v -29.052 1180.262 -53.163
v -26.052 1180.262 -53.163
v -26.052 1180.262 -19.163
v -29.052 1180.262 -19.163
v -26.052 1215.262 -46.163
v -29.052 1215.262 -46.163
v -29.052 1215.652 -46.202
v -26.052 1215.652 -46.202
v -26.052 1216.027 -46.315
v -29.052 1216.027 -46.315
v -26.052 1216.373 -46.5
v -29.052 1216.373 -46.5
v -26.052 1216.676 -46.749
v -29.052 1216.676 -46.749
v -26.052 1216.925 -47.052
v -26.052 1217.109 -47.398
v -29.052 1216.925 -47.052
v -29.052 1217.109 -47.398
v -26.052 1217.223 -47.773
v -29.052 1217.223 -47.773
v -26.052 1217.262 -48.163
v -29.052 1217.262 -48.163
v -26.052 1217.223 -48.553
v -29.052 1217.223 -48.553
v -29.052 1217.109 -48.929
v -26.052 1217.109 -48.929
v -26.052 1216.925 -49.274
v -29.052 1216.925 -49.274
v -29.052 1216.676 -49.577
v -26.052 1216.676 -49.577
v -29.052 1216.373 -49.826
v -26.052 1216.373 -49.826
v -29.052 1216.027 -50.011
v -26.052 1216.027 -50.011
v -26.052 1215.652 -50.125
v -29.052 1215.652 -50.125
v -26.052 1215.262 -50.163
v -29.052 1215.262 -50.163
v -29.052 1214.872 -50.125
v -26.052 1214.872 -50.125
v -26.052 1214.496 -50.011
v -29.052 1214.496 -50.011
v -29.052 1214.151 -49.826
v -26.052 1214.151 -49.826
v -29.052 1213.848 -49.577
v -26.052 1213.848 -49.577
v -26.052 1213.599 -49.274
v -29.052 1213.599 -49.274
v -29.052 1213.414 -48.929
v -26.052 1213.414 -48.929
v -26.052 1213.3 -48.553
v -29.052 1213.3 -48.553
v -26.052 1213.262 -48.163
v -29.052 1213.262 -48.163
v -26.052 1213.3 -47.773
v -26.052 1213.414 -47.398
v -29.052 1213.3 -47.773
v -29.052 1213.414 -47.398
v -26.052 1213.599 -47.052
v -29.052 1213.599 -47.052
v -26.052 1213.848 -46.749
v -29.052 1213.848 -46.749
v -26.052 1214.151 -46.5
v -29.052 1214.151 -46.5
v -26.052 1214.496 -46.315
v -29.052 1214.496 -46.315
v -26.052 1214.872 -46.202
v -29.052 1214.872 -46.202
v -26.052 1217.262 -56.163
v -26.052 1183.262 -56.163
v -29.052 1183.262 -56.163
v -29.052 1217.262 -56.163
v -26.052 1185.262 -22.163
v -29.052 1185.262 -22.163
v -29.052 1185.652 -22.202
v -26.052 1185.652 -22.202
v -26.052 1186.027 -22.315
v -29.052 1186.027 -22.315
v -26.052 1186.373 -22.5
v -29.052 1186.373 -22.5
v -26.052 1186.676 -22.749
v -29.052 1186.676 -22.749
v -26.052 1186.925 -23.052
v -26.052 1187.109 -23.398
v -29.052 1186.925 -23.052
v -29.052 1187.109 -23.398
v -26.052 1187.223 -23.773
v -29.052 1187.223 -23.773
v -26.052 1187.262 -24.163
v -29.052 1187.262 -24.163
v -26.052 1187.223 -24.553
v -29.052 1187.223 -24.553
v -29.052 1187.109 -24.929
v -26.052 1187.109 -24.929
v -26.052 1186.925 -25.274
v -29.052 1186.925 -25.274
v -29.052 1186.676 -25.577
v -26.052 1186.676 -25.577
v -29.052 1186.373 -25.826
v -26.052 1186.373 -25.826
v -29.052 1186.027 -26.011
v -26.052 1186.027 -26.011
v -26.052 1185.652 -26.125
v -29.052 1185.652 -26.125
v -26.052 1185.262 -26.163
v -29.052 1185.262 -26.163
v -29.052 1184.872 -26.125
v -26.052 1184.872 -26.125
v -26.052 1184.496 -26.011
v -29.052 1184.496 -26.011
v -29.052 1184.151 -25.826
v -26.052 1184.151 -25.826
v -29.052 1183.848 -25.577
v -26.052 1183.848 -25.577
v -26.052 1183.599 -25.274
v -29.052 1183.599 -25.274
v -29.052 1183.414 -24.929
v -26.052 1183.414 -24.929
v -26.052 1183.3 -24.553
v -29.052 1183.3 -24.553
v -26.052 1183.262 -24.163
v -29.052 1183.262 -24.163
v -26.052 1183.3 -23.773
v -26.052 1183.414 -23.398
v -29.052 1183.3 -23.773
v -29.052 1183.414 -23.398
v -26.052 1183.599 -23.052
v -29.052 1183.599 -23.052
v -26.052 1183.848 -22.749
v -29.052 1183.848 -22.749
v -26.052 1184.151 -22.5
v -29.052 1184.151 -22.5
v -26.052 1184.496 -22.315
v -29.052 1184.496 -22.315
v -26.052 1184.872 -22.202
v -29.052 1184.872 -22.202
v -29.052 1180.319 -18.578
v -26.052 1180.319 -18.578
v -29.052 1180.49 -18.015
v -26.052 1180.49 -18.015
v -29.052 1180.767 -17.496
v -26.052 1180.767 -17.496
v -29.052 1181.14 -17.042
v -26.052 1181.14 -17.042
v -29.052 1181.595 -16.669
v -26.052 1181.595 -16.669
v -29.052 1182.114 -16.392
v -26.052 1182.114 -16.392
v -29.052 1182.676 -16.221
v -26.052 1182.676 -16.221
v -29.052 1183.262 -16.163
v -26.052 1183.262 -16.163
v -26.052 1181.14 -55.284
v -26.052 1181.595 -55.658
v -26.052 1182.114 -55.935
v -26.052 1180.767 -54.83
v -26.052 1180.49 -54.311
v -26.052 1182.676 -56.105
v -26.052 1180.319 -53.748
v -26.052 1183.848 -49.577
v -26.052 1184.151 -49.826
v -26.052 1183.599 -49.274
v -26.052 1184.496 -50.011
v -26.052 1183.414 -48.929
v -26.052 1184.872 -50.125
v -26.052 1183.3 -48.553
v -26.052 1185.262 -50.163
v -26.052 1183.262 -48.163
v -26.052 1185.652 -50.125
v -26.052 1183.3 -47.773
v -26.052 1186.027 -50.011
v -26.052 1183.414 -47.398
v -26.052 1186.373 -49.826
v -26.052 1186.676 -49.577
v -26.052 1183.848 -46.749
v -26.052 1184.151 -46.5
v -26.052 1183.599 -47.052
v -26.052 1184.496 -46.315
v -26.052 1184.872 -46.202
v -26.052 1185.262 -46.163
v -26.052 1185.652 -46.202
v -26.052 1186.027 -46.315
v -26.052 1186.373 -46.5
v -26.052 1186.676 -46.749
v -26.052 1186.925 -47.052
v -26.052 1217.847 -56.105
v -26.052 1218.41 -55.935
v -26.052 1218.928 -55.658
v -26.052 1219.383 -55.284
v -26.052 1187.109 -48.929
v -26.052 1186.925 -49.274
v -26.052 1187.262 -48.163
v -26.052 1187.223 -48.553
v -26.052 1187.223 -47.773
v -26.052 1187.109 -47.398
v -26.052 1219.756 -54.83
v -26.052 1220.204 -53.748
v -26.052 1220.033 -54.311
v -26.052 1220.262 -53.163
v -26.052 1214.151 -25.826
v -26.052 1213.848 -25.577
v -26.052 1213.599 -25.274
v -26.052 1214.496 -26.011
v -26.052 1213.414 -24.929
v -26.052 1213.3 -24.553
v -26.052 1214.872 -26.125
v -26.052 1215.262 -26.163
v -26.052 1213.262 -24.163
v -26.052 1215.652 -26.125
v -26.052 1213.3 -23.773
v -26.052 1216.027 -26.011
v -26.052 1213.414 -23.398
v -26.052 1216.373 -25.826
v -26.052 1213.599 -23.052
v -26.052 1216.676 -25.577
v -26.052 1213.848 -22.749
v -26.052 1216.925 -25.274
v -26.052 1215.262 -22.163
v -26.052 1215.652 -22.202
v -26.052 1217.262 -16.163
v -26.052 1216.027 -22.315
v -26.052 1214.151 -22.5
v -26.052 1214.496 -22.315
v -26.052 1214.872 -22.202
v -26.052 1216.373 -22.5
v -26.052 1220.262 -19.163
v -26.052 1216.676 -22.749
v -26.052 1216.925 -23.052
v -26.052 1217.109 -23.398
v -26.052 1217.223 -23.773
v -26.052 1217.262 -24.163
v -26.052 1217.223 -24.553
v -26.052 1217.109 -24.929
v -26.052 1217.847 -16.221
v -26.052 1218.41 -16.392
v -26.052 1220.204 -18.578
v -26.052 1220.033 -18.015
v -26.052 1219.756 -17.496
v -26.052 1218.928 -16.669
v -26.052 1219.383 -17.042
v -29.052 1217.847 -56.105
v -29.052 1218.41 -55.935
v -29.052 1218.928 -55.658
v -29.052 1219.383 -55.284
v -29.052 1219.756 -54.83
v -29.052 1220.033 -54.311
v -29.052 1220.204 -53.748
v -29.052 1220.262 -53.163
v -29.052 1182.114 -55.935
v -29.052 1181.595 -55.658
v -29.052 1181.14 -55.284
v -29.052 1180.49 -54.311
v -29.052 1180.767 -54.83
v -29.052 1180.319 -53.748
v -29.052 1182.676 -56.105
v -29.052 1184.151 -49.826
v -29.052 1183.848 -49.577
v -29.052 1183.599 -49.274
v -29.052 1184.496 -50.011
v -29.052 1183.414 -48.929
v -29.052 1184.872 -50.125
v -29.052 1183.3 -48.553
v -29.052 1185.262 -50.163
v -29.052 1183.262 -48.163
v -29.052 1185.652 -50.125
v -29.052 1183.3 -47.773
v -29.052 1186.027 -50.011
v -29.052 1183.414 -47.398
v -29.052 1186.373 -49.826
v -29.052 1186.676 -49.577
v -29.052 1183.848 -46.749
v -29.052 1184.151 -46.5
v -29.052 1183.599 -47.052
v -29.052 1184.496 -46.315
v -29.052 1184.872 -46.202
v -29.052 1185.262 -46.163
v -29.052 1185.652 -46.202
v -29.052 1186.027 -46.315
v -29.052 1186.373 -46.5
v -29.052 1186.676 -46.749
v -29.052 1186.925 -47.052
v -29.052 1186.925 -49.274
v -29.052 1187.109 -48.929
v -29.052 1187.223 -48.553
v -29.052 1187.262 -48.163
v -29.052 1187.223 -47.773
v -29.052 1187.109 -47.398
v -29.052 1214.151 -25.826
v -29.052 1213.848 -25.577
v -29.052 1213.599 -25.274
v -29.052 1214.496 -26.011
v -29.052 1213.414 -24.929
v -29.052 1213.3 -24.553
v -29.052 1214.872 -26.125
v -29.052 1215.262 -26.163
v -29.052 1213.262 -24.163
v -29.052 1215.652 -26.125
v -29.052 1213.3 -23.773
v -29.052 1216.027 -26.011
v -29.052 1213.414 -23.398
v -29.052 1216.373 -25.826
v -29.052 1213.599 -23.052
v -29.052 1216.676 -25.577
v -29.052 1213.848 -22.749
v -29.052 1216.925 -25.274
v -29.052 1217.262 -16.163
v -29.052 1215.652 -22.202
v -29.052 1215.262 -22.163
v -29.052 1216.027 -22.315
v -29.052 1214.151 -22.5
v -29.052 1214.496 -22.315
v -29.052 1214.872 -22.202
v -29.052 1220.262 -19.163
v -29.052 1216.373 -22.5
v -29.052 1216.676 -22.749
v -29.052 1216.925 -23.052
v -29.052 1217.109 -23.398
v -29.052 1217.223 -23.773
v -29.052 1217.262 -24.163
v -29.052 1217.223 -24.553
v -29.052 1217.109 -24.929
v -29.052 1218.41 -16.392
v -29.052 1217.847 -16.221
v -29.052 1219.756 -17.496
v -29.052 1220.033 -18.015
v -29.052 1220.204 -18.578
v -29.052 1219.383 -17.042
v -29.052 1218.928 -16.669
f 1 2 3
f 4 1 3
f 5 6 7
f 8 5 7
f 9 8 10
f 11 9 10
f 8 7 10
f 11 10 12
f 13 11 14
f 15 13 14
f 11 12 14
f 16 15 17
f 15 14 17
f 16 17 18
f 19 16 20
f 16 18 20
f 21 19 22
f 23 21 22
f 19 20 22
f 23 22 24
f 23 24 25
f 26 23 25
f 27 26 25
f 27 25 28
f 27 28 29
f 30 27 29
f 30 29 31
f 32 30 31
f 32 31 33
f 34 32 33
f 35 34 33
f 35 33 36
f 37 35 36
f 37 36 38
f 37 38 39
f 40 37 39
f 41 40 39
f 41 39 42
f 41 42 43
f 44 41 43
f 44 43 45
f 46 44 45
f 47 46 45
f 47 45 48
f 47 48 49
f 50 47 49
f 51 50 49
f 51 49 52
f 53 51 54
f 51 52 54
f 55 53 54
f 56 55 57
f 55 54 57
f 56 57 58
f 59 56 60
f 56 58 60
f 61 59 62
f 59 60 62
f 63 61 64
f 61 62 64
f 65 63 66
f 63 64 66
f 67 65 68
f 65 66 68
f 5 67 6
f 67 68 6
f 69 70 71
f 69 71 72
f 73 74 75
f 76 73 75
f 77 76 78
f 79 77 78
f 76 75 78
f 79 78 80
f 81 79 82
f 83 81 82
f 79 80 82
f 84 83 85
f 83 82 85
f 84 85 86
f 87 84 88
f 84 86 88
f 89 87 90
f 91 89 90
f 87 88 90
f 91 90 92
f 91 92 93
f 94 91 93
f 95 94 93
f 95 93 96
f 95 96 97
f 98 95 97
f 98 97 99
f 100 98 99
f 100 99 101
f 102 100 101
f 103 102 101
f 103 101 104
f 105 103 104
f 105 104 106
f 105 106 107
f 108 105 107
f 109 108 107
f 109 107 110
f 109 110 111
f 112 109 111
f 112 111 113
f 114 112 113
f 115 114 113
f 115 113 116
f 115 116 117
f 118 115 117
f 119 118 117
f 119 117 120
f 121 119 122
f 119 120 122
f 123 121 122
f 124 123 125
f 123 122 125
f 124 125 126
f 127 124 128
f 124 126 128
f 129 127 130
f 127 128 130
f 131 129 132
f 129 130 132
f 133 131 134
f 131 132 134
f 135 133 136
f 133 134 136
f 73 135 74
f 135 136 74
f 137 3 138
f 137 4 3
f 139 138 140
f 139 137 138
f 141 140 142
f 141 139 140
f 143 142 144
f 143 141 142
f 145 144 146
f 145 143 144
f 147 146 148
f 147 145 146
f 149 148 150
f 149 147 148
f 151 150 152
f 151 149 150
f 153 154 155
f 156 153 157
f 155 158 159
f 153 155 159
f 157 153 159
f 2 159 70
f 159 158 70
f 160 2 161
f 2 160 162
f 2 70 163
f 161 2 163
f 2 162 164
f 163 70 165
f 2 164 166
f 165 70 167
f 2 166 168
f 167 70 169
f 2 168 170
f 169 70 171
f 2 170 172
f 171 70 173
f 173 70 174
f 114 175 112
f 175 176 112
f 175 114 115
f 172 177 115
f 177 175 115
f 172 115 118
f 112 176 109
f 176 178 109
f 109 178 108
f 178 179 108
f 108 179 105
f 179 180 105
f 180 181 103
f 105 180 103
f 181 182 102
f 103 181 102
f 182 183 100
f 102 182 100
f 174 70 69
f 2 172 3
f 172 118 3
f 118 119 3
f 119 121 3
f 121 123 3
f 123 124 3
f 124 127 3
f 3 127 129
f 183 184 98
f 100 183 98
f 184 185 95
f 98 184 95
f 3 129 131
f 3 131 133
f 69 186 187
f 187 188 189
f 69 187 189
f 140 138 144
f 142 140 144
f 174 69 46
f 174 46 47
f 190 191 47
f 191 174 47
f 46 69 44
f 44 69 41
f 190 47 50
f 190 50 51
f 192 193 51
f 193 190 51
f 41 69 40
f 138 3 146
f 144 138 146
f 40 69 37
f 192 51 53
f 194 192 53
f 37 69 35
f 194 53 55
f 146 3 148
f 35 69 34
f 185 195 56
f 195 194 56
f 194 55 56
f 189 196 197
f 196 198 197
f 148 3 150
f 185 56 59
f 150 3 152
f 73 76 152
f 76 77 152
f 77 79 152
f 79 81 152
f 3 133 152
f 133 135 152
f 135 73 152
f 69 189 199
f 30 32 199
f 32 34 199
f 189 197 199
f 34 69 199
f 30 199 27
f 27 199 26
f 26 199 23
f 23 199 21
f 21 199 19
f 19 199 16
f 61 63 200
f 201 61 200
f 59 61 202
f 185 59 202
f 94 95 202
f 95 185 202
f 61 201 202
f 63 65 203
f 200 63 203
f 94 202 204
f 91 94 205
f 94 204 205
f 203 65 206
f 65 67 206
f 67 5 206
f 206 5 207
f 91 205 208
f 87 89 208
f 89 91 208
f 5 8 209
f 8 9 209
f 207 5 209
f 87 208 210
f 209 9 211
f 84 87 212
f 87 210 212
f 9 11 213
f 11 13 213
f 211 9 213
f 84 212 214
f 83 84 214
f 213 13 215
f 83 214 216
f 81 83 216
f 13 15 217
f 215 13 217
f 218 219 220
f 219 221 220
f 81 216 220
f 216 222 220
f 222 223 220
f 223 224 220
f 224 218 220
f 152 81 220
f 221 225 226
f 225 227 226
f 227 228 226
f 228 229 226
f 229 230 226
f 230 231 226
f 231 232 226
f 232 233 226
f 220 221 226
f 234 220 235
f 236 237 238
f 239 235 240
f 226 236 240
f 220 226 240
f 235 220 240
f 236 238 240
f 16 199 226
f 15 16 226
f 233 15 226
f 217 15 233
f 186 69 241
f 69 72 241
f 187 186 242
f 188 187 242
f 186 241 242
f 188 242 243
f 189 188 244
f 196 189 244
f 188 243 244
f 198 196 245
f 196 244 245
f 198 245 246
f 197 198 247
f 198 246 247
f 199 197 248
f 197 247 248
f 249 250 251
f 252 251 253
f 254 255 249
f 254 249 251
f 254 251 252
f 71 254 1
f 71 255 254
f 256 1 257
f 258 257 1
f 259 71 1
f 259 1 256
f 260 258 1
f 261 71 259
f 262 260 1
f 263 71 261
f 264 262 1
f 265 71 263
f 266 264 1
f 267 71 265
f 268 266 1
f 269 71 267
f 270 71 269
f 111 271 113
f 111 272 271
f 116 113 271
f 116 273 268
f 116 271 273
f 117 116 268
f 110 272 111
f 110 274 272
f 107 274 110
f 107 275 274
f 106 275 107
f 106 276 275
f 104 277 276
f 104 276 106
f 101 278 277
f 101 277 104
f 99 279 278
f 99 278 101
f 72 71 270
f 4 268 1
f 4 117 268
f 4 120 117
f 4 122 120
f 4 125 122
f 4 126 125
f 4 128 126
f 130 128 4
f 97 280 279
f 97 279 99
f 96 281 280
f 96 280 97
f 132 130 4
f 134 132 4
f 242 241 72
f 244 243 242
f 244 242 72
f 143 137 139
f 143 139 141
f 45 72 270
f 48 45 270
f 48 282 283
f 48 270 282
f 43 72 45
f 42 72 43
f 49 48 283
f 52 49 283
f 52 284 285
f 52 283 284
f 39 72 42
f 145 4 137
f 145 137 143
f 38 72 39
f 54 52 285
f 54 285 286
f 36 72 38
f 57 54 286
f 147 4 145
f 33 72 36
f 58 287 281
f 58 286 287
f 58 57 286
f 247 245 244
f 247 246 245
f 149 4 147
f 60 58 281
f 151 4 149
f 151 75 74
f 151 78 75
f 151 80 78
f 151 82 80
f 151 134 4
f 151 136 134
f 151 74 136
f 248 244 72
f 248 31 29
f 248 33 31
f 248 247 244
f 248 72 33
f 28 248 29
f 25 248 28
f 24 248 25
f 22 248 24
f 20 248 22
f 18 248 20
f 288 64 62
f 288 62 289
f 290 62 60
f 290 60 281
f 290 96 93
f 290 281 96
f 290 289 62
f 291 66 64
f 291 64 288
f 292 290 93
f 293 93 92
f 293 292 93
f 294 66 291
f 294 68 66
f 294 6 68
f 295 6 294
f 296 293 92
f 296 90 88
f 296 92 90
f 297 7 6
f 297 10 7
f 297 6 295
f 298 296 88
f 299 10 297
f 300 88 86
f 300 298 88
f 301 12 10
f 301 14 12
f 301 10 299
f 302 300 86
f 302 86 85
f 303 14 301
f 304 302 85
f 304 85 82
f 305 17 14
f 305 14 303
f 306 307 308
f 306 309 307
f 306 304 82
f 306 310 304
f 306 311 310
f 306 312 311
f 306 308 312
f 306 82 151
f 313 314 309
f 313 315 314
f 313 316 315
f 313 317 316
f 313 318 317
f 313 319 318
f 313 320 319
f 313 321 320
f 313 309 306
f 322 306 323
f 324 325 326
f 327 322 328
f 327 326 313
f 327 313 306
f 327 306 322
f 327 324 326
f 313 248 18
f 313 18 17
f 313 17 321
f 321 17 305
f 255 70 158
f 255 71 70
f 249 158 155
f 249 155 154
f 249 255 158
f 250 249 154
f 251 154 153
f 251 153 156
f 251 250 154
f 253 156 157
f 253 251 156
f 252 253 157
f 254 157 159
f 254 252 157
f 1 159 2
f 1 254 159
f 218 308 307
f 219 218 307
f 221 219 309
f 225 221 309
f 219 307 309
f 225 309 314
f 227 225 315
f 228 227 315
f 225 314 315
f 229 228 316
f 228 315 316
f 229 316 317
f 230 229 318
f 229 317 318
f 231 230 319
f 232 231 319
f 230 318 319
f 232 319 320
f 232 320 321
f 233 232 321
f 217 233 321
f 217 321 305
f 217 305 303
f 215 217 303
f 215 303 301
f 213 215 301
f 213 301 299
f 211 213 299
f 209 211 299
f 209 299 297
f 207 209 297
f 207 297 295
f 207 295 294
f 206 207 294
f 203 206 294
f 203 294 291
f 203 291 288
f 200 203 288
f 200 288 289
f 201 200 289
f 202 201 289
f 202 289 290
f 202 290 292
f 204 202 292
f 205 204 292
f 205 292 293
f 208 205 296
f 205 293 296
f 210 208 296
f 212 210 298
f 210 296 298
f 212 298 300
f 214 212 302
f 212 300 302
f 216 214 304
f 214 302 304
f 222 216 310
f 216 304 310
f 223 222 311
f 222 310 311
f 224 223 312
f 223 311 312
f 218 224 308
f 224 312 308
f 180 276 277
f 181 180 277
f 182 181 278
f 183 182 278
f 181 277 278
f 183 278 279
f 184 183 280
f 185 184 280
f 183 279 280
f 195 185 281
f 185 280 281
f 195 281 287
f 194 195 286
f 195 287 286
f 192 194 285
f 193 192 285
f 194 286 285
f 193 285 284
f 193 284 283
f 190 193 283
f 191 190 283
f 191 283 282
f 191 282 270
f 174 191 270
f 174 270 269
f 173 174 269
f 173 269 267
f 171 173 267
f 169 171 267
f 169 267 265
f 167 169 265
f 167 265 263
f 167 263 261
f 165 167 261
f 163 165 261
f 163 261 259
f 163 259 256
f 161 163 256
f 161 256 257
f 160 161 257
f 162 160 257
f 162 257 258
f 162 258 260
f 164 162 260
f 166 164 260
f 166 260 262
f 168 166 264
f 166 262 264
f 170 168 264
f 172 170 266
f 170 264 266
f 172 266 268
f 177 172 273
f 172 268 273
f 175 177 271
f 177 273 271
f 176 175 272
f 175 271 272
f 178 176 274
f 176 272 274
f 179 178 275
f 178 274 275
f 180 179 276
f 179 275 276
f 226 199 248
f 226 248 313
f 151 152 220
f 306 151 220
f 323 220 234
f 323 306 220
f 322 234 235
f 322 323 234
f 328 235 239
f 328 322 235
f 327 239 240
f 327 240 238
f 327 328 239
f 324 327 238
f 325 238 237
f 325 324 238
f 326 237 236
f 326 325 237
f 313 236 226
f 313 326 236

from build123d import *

# Parameters (mm, degrees)
SKETCH1_W           = 40
SKETCH1_H           = 40
BOSS_EXTRUDE1_DEPTH = 3
FILLET1_R           = 3
CUT_EXTRUDE1_REACH  = 5
SKETCH2_R           = 2


with BuildPart() as part:
    # Sketch1 → Boss-Extrude1 (new body)
    with BuildSketch(Plane.ZY.offset(26.051745534)):
        with Locations((-36.163138966, 1200.261717599)):
            Rectangle(SKETCH1_W, SKETCH1_H)
    extrude(amount=BOSS_EXTRUDE1_DEPTH)

    # Fillet1
    fillet1_edges = [part.edges().sort_by_distance(p)[0] for p in [
        (-27.551745534, 1220.261717599, -56.163138966),
        (-27.551745534, 1220.261717599, -16.163138966),
        (-27.551745534, 1180.261717599, -16.163138966),
        (-27.551745534, 1180.261717599, -56.163138966),
    ]]
    fillet(fillet1_edges, radius=FILLET1_R)

    # Sketch2 → Cut-Extrude1 (cut, up to next)
    with BuildSketch(Plane.ZY.offset(29.051745534), mode=Mode.PRIVATE) as cut_extrude1_sk1:
        with Locations((-48.163138966, 1215.261717599)):
            Circle(SKETCH2_R)
    cut_extrude1_tool1 = extrude(cut_extrude1_sk1.sketch, amount=-CUT_EXTRUDE1_REACH, mode=Mode.PRIVATE) & part.part
    add(cut_extrude1_tool1.solids().sort_by_distance((-29.051746, 1215.261718, -48.163139))[0], mode=Mode.SUBTRACT)
    # Sketch2 → Cut-Extrude1 (cut, up to next)
    with BuildSketch(Plane.ZY.offset(29.051745534), mode=Mode.PRIVATE) as cut_extrude1_sk2:
        with Locations((-24.163138966, 1215.261717599)):
            Circle(SKETCH2_R)
    cut_extrude1_tool2 = extrude(cut_extrude1_sk2.sketch, amount=-CUT_EXTRUDE1_REACH, mode=Mode.PRIVATE) & part.part
    add(cut_extrude1_tool2.solids().sort_by_distance((-29.051746, 1215.261718, -24.163139))[0], mode=Mode.SUBTRACT)
    # Sketch2 → Cut-Extrude1 (cut, up to next)
    with BuildSketch(Plane.ZY.offset(29.051745534), mode=Mode.PRIVATE) as cut_extrude1_sk3:
        with Locations((-24.163138966, 1185.261717599)):
            Circle(SKETCH2_R)
    cut_extrude1_tool3 = extrude(cut_extrude1_sk3.sketch, amount=-CUT_EXTRUDE1_REACH, mode=Mode.PRIVATE) & part.part
    add(cut_extrude1_tool3.solids().sort_by_distance((-29.051746, 1185.261718, -24.163139))[0], mode=Mode.SUBTRACT)
    # Sketch2 → Cut-Extrude1 (cut, up to next)
    with BuildSketch(Plane.ZY.offset(29.051745534), mode=Mode.PRIVATE) as cut_extrude1_sk4:
        with Locations((-48.163138966, 1185.261717599)):
            Circle(SKETCH2_R)
    cut_extrude1_tool4 = extrude(cut_extrude1_sk4.sketch, amount=-CUT_EXTRUDE1_REACH, mode=Mode.PRIVATE) & part.part
    add(cut_extrude1_tool4.solids().sort_by_distance((-29.051746, 1185.261718, -48.163139))[0], mode=Mode.SUBTRACT)


solid = part.part
